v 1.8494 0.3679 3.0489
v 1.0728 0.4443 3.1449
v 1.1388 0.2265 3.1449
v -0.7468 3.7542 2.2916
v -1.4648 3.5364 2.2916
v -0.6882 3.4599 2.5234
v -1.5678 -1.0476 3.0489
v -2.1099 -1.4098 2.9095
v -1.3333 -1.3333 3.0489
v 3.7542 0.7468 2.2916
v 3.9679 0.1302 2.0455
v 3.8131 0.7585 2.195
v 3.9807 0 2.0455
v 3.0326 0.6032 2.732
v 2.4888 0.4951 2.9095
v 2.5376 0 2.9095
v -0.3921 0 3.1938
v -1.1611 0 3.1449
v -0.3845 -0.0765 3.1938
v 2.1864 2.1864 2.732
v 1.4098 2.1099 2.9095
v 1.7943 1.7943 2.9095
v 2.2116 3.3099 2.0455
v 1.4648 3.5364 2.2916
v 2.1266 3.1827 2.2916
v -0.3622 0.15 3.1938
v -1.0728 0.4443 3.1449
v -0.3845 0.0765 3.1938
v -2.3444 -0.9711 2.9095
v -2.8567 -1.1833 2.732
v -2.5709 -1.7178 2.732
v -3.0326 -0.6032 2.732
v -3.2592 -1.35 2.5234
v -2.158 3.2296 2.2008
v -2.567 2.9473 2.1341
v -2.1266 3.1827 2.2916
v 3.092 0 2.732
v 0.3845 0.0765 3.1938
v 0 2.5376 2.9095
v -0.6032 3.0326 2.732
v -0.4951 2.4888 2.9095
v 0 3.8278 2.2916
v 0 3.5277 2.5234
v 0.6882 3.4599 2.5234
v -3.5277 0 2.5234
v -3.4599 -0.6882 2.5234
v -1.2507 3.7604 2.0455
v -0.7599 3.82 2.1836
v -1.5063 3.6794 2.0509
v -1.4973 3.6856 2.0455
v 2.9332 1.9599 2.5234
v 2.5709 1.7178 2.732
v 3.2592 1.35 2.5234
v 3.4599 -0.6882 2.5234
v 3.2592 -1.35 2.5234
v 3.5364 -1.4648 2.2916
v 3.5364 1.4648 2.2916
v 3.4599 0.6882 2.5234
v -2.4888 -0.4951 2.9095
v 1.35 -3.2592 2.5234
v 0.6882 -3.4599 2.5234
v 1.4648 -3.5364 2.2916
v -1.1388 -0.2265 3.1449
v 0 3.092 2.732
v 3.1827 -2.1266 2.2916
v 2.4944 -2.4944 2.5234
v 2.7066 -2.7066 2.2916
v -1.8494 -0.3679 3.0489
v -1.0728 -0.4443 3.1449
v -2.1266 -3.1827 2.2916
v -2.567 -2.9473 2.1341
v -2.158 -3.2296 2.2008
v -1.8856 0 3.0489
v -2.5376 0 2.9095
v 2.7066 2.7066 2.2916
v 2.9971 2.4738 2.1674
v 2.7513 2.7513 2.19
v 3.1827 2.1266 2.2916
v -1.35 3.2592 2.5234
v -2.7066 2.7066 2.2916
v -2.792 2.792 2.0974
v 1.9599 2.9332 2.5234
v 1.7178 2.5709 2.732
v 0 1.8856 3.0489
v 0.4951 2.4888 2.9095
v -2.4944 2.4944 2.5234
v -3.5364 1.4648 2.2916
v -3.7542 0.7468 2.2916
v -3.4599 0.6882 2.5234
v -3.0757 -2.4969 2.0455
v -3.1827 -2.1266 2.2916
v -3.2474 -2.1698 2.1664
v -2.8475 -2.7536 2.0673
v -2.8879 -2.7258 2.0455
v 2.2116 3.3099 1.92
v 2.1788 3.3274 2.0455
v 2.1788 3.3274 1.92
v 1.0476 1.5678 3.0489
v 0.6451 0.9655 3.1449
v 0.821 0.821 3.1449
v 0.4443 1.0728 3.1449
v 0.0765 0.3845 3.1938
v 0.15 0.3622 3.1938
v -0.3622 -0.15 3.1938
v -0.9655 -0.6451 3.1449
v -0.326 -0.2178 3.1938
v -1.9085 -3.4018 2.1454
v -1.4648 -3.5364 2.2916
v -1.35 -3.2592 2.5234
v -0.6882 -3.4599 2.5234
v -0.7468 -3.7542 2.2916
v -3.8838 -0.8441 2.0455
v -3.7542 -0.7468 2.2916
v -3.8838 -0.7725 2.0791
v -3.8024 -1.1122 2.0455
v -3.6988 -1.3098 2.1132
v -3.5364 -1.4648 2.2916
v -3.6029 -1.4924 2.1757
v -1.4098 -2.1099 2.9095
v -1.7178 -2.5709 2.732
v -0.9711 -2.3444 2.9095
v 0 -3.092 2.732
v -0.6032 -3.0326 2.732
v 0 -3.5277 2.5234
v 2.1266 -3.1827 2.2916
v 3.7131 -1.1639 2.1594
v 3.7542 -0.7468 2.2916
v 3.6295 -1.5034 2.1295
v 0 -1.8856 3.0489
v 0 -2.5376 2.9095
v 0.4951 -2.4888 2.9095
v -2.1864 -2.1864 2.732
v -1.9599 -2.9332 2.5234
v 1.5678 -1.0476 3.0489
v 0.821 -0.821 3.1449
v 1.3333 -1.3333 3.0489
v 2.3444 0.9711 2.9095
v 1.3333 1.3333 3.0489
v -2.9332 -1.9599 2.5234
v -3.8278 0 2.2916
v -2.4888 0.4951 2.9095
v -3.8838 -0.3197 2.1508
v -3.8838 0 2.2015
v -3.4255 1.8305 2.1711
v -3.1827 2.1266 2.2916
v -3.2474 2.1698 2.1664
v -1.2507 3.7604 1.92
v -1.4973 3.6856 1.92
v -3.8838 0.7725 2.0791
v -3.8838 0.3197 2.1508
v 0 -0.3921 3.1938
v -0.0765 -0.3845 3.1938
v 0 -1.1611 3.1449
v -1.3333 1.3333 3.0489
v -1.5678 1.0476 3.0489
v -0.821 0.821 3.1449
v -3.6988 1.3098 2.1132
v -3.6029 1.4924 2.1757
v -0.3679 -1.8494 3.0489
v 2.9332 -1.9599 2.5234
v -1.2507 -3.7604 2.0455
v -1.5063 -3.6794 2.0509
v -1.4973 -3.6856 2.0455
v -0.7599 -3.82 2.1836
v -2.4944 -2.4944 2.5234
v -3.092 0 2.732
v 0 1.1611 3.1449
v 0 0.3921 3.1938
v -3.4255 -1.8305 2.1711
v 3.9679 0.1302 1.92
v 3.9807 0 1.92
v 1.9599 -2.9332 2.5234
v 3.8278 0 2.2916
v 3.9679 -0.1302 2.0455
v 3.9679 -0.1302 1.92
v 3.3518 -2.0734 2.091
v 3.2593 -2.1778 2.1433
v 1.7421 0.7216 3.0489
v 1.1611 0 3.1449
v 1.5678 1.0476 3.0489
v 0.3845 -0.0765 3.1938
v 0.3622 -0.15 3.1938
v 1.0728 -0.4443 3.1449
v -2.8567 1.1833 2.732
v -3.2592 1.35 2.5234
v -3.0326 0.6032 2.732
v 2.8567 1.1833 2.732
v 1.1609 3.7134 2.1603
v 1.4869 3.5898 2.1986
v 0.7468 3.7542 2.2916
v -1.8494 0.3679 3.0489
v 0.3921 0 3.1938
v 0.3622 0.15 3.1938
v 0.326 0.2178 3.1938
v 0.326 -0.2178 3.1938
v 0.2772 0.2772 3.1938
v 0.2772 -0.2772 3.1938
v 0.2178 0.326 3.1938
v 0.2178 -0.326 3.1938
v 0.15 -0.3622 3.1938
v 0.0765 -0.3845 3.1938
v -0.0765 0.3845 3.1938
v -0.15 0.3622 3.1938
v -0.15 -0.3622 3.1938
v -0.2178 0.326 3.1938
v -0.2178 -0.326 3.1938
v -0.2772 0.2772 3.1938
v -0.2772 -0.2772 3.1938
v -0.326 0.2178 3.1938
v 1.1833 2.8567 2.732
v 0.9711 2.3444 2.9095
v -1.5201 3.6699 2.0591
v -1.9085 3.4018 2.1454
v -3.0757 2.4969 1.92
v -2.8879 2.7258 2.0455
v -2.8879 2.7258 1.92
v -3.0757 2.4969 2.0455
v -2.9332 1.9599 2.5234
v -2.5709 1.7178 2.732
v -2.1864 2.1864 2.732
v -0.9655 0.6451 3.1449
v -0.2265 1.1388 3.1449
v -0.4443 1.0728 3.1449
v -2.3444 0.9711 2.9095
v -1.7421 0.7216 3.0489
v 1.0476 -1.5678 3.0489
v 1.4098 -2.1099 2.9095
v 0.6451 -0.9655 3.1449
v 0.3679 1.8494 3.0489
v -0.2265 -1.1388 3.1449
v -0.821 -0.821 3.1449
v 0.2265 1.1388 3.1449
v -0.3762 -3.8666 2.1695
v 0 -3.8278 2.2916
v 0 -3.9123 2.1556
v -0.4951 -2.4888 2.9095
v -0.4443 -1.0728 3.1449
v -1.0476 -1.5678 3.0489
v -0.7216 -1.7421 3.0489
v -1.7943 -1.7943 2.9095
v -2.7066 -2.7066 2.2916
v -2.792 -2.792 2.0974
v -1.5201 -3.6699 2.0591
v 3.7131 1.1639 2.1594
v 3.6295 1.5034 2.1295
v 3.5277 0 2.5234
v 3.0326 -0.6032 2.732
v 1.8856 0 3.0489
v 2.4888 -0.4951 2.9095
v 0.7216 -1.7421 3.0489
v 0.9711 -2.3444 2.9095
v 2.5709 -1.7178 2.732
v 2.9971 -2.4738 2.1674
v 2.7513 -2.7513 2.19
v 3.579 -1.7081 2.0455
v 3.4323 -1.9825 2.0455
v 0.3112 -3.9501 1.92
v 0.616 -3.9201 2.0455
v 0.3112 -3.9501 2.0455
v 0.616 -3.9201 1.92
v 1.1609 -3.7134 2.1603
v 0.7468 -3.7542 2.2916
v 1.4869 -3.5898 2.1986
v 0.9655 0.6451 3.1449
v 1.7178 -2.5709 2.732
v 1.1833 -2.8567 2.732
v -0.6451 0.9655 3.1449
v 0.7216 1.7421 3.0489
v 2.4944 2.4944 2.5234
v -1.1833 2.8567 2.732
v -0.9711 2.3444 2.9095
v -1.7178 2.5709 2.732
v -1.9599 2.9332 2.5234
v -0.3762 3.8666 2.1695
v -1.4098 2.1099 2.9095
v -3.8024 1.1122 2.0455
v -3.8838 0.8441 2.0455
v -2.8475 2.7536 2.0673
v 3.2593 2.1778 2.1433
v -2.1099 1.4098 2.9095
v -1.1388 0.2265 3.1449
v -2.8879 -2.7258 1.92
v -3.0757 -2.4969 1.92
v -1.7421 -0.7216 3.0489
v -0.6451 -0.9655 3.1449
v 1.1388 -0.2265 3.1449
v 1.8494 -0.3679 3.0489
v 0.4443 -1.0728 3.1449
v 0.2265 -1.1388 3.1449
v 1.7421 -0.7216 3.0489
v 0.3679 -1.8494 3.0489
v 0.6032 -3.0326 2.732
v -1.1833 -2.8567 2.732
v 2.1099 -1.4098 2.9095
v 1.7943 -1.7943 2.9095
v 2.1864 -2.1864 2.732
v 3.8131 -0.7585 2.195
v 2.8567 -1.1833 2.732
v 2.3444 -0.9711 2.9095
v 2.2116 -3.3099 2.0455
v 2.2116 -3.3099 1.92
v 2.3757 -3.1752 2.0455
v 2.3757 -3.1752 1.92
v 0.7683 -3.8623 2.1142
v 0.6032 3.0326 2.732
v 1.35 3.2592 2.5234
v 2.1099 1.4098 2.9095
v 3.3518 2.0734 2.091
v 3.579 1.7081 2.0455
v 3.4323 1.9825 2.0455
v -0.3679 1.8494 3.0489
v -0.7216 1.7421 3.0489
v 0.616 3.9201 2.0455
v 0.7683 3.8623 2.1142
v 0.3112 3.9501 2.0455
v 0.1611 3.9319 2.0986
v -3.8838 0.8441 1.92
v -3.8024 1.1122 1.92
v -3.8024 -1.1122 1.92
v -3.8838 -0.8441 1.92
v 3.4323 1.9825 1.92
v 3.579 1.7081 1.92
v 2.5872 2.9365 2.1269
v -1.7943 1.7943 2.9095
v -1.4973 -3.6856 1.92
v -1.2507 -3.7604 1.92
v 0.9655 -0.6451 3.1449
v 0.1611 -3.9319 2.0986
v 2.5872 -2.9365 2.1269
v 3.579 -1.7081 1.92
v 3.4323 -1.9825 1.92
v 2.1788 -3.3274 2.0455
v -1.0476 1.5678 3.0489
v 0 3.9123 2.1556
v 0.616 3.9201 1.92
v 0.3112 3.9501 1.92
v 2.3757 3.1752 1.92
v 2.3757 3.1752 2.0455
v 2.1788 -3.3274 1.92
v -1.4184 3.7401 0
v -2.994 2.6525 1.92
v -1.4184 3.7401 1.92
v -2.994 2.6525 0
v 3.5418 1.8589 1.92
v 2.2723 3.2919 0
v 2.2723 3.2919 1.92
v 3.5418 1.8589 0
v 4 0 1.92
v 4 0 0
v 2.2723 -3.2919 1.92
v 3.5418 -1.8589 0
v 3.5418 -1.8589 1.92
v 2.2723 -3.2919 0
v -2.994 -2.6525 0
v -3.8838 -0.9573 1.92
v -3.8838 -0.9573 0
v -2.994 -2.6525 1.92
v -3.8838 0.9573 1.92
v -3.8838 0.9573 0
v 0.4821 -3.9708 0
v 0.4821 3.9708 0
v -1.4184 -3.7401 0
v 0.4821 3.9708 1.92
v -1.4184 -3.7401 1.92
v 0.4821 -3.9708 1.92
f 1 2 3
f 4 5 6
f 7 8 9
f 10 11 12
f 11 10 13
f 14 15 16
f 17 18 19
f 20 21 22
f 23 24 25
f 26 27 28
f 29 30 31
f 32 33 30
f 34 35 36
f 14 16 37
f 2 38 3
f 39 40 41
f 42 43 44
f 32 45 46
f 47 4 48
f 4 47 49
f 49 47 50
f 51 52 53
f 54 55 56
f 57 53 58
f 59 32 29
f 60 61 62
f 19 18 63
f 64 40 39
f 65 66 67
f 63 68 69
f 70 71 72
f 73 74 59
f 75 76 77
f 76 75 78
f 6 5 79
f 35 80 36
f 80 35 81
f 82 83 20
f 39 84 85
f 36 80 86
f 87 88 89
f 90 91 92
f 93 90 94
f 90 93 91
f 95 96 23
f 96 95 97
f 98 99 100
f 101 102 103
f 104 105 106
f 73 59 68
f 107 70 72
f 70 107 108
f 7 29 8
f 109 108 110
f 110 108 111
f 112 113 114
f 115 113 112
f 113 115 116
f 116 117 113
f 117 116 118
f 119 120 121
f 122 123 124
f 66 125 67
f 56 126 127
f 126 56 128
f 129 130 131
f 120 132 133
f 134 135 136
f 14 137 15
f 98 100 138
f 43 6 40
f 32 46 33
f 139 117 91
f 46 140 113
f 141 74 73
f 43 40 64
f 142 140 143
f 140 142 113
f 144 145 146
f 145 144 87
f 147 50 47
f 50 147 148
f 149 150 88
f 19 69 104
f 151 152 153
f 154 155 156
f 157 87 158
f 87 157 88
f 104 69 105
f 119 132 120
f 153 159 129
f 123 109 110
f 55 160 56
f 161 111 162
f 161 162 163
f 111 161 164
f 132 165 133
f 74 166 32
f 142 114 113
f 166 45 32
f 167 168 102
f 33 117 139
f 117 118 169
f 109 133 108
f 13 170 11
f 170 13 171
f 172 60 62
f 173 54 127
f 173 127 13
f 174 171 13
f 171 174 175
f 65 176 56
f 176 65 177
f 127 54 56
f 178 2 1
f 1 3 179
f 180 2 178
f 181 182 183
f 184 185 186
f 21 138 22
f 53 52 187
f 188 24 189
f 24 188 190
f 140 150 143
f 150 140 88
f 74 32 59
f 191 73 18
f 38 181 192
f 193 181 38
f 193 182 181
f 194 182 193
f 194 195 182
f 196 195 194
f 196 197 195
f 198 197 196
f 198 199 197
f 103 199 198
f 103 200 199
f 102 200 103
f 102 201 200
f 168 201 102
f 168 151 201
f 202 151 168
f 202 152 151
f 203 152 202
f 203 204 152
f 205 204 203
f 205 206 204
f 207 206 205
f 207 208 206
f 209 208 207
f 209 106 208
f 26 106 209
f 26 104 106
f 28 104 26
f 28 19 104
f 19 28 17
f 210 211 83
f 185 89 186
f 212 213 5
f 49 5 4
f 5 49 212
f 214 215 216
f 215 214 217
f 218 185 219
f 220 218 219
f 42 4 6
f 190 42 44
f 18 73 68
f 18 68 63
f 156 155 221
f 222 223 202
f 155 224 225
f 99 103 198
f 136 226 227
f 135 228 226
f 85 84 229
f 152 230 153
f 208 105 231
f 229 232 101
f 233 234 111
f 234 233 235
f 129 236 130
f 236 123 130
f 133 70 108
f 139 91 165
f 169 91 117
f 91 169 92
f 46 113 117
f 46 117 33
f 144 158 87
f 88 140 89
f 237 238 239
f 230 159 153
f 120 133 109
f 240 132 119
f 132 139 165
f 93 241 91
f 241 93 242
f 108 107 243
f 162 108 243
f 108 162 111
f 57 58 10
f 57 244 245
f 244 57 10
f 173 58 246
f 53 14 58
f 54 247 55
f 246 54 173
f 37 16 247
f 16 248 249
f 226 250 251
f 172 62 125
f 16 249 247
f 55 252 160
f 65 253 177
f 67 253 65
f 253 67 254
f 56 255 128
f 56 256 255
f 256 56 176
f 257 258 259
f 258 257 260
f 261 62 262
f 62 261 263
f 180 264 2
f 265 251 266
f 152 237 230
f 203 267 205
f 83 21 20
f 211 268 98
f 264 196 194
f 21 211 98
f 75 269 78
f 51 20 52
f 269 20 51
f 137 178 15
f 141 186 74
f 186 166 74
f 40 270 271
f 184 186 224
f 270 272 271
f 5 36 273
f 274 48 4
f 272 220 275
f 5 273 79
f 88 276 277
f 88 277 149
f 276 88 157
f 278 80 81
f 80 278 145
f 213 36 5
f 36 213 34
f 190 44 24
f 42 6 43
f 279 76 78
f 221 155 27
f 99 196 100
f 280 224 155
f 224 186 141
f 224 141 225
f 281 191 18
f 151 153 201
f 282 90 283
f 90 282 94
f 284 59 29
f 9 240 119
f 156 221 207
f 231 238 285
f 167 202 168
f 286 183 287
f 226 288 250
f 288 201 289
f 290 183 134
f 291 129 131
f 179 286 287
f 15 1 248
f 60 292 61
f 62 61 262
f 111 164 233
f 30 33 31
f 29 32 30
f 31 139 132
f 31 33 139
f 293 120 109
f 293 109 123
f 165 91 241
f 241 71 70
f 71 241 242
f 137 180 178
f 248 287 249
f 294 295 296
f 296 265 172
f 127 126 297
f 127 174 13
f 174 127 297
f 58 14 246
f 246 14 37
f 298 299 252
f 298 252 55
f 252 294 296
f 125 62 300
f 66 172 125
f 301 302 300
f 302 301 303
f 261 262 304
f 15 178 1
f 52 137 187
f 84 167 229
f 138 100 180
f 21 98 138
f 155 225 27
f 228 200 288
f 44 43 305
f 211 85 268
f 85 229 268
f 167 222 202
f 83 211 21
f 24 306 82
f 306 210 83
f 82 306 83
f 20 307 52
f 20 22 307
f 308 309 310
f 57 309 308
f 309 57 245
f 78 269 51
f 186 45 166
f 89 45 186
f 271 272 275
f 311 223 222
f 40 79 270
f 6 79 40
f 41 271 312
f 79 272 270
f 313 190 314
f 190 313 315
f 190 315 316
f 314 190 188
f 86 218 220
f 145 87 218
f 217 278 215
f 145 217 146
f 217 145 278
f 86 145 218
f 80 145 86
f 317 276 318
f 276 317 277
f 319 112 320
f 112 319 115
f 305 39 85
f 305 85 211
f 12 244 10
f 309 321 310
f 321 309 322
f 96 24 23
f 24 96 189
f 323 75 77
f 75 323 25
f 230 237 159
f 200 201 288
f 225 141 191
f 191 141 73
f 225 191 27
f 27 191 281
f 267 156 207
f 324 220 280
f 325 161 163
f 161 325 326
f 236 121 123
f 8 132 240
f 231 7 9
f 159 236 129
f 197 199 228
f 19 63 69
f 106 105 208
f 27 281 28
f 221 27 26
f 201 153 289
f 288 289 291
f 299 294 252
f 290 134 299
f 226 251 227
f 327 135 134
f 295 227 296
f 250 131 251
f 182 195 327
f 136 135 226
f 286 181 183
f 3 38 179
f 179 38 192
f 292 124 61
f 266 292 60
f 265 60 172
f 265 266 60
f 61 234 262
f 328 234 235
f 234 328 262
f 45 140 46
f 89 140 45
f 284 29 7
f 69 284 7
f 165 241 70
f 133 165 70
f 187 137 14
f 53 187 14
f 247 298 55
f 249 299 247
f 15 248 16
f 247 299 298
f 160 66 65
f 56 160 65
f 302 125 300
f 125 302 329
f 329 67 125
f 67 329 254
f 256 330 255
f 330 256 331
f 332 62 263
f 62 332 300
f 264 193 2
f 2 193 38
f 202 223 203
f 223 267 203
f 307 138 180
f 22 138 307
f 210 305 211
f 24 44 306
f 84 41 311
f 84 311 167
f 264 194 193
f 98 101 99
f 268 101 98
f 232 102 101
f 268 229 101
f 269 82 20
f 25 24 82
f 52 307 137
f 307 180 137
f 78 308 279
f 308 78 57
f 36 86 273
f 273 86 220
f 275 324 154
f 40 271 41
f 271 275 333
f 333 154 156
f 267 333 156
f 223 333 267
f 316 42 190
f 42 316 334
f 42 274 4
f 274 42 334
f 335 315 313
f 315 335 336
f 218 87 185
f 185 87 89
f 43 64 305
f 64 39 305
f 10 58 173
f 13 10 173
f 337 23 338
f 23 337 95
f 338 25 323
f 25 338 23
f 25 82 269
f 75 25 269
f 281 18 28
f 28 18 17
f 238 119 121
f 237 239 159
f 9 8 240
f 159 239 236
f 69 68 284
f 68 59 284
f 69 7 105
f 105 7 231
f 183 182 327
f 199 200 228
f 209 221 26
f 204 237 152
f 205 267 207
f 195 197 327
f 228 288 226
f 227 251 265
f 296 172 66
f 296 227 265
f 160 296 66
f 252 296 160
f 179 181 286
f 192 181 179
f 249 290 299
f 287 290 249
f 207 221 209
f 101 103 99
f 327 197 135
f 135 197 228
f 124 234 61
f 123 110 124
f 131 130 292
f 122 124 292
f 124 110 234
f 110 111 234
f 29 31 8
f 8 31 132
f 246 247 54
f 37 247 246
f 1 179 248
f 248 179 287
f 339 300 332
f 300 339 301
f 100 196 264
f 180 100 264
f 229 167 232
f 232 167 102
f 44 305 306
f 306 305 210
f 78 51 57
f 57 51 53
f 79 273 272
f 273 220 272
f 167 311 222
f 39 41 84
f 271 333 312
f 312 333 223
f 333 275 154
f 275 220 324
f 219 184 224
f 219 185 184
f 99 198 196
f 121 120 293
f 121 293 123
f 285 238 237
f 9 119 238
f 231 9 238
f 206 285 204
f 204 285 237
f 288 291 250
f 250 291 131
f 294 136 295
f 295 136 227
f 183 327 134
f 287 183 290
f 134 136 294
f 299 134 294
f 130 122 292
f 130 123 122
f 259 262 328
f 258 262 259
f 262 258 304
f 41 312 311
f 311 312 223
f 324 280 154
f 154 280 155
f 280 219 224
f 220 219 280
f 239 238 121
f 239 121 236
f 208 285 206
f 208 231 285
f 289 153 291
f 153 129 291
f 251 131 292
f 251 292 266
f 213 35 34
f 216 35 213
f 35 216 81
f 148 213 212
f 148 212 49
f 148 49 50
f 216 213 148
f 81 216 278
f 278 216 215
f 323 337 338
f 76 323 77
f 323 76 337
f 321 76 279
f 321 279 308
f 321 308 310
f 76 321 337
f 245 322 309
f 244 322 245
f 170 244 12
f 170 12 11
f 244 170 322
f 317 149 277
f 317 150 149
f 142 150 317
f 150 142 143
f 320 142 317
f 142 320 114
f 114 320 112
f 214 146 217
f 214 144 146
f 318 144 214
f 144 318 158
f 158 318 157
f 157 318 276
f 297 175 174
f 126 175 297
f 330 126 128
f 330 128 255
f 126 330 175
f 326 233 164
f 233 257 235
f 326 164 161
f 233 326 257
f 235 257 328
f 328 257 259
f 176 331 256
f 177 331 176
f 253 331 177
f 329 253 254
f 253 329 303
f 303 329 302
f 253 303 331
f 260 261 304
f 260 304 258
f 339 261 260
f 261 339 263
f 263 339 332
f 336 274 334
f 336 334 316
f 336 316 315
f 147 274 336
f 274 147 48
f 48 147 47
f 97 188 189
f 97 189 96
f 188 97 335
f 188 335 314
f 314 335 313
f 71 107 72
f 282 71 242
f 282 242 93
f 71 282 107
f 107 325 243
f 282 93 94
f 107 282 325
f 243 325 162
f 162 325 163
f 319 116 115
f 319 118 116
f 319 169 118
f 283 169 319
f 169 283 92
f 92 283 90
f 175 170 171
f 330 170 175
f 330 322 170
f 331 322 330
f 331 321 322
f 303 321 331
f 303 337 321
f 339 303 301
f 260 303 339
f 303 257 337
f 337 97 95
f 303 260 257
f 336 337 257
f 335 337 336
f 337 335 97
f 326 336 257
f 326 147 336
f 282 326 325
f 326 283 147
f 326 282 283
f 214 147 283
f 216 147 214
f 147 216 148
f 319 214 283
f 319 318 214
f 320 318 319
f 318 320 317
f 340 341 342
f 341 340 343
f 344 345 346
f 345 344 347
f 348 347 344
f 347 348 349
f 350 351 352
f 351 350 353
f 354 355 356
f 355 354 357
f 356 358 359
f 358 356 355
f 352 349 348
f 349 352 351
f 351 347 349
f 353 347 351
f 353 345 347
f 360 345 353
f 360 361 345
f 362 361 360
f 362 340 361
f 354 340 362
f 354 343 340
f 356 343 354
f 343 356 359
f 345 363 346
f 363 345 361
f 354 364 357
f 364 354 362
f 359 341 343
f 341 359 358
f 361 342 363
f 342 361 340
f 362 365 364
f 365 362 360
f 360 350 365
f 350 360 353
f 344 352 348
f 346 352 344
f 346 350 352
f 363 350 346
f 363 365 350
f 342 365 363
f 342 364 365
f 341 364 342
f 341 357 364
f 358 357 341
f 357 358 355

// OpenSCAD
// studs/rivet.scad — rounded button rivet, like a tiny mushroom cap.
// MIT licensed.
//
// Industrial set. Looks like a smashed-flat ball bearing. Low profile,
// reads as "loose hardware" in mass on a band.

module stud_rivet(size = 6, tip_radius = 0.4, height = undef) {
    h = is_undef(height) ? size * 0.4 : height;

    // Body: short cylinder with a domed top. The dome is half a flattened
    // sphere intersected with the cap region so it doesn't peak too high.
    cyl_h = h * 0.6;
    dome_h = h * 0.4;

    union() {
        cylinder(h = cyl_h, r = size / 2);
        translate([0, 0, cyl_h]) {
            intersection() {
                scale([1, 1, dome_h / (size / 2)])
                    sphere(r = size / 2, $fn = 32);
                cylinder(h = dome_h, r = size / 2);
            }
        }
    }
}

stud_rivet(size = 8);
